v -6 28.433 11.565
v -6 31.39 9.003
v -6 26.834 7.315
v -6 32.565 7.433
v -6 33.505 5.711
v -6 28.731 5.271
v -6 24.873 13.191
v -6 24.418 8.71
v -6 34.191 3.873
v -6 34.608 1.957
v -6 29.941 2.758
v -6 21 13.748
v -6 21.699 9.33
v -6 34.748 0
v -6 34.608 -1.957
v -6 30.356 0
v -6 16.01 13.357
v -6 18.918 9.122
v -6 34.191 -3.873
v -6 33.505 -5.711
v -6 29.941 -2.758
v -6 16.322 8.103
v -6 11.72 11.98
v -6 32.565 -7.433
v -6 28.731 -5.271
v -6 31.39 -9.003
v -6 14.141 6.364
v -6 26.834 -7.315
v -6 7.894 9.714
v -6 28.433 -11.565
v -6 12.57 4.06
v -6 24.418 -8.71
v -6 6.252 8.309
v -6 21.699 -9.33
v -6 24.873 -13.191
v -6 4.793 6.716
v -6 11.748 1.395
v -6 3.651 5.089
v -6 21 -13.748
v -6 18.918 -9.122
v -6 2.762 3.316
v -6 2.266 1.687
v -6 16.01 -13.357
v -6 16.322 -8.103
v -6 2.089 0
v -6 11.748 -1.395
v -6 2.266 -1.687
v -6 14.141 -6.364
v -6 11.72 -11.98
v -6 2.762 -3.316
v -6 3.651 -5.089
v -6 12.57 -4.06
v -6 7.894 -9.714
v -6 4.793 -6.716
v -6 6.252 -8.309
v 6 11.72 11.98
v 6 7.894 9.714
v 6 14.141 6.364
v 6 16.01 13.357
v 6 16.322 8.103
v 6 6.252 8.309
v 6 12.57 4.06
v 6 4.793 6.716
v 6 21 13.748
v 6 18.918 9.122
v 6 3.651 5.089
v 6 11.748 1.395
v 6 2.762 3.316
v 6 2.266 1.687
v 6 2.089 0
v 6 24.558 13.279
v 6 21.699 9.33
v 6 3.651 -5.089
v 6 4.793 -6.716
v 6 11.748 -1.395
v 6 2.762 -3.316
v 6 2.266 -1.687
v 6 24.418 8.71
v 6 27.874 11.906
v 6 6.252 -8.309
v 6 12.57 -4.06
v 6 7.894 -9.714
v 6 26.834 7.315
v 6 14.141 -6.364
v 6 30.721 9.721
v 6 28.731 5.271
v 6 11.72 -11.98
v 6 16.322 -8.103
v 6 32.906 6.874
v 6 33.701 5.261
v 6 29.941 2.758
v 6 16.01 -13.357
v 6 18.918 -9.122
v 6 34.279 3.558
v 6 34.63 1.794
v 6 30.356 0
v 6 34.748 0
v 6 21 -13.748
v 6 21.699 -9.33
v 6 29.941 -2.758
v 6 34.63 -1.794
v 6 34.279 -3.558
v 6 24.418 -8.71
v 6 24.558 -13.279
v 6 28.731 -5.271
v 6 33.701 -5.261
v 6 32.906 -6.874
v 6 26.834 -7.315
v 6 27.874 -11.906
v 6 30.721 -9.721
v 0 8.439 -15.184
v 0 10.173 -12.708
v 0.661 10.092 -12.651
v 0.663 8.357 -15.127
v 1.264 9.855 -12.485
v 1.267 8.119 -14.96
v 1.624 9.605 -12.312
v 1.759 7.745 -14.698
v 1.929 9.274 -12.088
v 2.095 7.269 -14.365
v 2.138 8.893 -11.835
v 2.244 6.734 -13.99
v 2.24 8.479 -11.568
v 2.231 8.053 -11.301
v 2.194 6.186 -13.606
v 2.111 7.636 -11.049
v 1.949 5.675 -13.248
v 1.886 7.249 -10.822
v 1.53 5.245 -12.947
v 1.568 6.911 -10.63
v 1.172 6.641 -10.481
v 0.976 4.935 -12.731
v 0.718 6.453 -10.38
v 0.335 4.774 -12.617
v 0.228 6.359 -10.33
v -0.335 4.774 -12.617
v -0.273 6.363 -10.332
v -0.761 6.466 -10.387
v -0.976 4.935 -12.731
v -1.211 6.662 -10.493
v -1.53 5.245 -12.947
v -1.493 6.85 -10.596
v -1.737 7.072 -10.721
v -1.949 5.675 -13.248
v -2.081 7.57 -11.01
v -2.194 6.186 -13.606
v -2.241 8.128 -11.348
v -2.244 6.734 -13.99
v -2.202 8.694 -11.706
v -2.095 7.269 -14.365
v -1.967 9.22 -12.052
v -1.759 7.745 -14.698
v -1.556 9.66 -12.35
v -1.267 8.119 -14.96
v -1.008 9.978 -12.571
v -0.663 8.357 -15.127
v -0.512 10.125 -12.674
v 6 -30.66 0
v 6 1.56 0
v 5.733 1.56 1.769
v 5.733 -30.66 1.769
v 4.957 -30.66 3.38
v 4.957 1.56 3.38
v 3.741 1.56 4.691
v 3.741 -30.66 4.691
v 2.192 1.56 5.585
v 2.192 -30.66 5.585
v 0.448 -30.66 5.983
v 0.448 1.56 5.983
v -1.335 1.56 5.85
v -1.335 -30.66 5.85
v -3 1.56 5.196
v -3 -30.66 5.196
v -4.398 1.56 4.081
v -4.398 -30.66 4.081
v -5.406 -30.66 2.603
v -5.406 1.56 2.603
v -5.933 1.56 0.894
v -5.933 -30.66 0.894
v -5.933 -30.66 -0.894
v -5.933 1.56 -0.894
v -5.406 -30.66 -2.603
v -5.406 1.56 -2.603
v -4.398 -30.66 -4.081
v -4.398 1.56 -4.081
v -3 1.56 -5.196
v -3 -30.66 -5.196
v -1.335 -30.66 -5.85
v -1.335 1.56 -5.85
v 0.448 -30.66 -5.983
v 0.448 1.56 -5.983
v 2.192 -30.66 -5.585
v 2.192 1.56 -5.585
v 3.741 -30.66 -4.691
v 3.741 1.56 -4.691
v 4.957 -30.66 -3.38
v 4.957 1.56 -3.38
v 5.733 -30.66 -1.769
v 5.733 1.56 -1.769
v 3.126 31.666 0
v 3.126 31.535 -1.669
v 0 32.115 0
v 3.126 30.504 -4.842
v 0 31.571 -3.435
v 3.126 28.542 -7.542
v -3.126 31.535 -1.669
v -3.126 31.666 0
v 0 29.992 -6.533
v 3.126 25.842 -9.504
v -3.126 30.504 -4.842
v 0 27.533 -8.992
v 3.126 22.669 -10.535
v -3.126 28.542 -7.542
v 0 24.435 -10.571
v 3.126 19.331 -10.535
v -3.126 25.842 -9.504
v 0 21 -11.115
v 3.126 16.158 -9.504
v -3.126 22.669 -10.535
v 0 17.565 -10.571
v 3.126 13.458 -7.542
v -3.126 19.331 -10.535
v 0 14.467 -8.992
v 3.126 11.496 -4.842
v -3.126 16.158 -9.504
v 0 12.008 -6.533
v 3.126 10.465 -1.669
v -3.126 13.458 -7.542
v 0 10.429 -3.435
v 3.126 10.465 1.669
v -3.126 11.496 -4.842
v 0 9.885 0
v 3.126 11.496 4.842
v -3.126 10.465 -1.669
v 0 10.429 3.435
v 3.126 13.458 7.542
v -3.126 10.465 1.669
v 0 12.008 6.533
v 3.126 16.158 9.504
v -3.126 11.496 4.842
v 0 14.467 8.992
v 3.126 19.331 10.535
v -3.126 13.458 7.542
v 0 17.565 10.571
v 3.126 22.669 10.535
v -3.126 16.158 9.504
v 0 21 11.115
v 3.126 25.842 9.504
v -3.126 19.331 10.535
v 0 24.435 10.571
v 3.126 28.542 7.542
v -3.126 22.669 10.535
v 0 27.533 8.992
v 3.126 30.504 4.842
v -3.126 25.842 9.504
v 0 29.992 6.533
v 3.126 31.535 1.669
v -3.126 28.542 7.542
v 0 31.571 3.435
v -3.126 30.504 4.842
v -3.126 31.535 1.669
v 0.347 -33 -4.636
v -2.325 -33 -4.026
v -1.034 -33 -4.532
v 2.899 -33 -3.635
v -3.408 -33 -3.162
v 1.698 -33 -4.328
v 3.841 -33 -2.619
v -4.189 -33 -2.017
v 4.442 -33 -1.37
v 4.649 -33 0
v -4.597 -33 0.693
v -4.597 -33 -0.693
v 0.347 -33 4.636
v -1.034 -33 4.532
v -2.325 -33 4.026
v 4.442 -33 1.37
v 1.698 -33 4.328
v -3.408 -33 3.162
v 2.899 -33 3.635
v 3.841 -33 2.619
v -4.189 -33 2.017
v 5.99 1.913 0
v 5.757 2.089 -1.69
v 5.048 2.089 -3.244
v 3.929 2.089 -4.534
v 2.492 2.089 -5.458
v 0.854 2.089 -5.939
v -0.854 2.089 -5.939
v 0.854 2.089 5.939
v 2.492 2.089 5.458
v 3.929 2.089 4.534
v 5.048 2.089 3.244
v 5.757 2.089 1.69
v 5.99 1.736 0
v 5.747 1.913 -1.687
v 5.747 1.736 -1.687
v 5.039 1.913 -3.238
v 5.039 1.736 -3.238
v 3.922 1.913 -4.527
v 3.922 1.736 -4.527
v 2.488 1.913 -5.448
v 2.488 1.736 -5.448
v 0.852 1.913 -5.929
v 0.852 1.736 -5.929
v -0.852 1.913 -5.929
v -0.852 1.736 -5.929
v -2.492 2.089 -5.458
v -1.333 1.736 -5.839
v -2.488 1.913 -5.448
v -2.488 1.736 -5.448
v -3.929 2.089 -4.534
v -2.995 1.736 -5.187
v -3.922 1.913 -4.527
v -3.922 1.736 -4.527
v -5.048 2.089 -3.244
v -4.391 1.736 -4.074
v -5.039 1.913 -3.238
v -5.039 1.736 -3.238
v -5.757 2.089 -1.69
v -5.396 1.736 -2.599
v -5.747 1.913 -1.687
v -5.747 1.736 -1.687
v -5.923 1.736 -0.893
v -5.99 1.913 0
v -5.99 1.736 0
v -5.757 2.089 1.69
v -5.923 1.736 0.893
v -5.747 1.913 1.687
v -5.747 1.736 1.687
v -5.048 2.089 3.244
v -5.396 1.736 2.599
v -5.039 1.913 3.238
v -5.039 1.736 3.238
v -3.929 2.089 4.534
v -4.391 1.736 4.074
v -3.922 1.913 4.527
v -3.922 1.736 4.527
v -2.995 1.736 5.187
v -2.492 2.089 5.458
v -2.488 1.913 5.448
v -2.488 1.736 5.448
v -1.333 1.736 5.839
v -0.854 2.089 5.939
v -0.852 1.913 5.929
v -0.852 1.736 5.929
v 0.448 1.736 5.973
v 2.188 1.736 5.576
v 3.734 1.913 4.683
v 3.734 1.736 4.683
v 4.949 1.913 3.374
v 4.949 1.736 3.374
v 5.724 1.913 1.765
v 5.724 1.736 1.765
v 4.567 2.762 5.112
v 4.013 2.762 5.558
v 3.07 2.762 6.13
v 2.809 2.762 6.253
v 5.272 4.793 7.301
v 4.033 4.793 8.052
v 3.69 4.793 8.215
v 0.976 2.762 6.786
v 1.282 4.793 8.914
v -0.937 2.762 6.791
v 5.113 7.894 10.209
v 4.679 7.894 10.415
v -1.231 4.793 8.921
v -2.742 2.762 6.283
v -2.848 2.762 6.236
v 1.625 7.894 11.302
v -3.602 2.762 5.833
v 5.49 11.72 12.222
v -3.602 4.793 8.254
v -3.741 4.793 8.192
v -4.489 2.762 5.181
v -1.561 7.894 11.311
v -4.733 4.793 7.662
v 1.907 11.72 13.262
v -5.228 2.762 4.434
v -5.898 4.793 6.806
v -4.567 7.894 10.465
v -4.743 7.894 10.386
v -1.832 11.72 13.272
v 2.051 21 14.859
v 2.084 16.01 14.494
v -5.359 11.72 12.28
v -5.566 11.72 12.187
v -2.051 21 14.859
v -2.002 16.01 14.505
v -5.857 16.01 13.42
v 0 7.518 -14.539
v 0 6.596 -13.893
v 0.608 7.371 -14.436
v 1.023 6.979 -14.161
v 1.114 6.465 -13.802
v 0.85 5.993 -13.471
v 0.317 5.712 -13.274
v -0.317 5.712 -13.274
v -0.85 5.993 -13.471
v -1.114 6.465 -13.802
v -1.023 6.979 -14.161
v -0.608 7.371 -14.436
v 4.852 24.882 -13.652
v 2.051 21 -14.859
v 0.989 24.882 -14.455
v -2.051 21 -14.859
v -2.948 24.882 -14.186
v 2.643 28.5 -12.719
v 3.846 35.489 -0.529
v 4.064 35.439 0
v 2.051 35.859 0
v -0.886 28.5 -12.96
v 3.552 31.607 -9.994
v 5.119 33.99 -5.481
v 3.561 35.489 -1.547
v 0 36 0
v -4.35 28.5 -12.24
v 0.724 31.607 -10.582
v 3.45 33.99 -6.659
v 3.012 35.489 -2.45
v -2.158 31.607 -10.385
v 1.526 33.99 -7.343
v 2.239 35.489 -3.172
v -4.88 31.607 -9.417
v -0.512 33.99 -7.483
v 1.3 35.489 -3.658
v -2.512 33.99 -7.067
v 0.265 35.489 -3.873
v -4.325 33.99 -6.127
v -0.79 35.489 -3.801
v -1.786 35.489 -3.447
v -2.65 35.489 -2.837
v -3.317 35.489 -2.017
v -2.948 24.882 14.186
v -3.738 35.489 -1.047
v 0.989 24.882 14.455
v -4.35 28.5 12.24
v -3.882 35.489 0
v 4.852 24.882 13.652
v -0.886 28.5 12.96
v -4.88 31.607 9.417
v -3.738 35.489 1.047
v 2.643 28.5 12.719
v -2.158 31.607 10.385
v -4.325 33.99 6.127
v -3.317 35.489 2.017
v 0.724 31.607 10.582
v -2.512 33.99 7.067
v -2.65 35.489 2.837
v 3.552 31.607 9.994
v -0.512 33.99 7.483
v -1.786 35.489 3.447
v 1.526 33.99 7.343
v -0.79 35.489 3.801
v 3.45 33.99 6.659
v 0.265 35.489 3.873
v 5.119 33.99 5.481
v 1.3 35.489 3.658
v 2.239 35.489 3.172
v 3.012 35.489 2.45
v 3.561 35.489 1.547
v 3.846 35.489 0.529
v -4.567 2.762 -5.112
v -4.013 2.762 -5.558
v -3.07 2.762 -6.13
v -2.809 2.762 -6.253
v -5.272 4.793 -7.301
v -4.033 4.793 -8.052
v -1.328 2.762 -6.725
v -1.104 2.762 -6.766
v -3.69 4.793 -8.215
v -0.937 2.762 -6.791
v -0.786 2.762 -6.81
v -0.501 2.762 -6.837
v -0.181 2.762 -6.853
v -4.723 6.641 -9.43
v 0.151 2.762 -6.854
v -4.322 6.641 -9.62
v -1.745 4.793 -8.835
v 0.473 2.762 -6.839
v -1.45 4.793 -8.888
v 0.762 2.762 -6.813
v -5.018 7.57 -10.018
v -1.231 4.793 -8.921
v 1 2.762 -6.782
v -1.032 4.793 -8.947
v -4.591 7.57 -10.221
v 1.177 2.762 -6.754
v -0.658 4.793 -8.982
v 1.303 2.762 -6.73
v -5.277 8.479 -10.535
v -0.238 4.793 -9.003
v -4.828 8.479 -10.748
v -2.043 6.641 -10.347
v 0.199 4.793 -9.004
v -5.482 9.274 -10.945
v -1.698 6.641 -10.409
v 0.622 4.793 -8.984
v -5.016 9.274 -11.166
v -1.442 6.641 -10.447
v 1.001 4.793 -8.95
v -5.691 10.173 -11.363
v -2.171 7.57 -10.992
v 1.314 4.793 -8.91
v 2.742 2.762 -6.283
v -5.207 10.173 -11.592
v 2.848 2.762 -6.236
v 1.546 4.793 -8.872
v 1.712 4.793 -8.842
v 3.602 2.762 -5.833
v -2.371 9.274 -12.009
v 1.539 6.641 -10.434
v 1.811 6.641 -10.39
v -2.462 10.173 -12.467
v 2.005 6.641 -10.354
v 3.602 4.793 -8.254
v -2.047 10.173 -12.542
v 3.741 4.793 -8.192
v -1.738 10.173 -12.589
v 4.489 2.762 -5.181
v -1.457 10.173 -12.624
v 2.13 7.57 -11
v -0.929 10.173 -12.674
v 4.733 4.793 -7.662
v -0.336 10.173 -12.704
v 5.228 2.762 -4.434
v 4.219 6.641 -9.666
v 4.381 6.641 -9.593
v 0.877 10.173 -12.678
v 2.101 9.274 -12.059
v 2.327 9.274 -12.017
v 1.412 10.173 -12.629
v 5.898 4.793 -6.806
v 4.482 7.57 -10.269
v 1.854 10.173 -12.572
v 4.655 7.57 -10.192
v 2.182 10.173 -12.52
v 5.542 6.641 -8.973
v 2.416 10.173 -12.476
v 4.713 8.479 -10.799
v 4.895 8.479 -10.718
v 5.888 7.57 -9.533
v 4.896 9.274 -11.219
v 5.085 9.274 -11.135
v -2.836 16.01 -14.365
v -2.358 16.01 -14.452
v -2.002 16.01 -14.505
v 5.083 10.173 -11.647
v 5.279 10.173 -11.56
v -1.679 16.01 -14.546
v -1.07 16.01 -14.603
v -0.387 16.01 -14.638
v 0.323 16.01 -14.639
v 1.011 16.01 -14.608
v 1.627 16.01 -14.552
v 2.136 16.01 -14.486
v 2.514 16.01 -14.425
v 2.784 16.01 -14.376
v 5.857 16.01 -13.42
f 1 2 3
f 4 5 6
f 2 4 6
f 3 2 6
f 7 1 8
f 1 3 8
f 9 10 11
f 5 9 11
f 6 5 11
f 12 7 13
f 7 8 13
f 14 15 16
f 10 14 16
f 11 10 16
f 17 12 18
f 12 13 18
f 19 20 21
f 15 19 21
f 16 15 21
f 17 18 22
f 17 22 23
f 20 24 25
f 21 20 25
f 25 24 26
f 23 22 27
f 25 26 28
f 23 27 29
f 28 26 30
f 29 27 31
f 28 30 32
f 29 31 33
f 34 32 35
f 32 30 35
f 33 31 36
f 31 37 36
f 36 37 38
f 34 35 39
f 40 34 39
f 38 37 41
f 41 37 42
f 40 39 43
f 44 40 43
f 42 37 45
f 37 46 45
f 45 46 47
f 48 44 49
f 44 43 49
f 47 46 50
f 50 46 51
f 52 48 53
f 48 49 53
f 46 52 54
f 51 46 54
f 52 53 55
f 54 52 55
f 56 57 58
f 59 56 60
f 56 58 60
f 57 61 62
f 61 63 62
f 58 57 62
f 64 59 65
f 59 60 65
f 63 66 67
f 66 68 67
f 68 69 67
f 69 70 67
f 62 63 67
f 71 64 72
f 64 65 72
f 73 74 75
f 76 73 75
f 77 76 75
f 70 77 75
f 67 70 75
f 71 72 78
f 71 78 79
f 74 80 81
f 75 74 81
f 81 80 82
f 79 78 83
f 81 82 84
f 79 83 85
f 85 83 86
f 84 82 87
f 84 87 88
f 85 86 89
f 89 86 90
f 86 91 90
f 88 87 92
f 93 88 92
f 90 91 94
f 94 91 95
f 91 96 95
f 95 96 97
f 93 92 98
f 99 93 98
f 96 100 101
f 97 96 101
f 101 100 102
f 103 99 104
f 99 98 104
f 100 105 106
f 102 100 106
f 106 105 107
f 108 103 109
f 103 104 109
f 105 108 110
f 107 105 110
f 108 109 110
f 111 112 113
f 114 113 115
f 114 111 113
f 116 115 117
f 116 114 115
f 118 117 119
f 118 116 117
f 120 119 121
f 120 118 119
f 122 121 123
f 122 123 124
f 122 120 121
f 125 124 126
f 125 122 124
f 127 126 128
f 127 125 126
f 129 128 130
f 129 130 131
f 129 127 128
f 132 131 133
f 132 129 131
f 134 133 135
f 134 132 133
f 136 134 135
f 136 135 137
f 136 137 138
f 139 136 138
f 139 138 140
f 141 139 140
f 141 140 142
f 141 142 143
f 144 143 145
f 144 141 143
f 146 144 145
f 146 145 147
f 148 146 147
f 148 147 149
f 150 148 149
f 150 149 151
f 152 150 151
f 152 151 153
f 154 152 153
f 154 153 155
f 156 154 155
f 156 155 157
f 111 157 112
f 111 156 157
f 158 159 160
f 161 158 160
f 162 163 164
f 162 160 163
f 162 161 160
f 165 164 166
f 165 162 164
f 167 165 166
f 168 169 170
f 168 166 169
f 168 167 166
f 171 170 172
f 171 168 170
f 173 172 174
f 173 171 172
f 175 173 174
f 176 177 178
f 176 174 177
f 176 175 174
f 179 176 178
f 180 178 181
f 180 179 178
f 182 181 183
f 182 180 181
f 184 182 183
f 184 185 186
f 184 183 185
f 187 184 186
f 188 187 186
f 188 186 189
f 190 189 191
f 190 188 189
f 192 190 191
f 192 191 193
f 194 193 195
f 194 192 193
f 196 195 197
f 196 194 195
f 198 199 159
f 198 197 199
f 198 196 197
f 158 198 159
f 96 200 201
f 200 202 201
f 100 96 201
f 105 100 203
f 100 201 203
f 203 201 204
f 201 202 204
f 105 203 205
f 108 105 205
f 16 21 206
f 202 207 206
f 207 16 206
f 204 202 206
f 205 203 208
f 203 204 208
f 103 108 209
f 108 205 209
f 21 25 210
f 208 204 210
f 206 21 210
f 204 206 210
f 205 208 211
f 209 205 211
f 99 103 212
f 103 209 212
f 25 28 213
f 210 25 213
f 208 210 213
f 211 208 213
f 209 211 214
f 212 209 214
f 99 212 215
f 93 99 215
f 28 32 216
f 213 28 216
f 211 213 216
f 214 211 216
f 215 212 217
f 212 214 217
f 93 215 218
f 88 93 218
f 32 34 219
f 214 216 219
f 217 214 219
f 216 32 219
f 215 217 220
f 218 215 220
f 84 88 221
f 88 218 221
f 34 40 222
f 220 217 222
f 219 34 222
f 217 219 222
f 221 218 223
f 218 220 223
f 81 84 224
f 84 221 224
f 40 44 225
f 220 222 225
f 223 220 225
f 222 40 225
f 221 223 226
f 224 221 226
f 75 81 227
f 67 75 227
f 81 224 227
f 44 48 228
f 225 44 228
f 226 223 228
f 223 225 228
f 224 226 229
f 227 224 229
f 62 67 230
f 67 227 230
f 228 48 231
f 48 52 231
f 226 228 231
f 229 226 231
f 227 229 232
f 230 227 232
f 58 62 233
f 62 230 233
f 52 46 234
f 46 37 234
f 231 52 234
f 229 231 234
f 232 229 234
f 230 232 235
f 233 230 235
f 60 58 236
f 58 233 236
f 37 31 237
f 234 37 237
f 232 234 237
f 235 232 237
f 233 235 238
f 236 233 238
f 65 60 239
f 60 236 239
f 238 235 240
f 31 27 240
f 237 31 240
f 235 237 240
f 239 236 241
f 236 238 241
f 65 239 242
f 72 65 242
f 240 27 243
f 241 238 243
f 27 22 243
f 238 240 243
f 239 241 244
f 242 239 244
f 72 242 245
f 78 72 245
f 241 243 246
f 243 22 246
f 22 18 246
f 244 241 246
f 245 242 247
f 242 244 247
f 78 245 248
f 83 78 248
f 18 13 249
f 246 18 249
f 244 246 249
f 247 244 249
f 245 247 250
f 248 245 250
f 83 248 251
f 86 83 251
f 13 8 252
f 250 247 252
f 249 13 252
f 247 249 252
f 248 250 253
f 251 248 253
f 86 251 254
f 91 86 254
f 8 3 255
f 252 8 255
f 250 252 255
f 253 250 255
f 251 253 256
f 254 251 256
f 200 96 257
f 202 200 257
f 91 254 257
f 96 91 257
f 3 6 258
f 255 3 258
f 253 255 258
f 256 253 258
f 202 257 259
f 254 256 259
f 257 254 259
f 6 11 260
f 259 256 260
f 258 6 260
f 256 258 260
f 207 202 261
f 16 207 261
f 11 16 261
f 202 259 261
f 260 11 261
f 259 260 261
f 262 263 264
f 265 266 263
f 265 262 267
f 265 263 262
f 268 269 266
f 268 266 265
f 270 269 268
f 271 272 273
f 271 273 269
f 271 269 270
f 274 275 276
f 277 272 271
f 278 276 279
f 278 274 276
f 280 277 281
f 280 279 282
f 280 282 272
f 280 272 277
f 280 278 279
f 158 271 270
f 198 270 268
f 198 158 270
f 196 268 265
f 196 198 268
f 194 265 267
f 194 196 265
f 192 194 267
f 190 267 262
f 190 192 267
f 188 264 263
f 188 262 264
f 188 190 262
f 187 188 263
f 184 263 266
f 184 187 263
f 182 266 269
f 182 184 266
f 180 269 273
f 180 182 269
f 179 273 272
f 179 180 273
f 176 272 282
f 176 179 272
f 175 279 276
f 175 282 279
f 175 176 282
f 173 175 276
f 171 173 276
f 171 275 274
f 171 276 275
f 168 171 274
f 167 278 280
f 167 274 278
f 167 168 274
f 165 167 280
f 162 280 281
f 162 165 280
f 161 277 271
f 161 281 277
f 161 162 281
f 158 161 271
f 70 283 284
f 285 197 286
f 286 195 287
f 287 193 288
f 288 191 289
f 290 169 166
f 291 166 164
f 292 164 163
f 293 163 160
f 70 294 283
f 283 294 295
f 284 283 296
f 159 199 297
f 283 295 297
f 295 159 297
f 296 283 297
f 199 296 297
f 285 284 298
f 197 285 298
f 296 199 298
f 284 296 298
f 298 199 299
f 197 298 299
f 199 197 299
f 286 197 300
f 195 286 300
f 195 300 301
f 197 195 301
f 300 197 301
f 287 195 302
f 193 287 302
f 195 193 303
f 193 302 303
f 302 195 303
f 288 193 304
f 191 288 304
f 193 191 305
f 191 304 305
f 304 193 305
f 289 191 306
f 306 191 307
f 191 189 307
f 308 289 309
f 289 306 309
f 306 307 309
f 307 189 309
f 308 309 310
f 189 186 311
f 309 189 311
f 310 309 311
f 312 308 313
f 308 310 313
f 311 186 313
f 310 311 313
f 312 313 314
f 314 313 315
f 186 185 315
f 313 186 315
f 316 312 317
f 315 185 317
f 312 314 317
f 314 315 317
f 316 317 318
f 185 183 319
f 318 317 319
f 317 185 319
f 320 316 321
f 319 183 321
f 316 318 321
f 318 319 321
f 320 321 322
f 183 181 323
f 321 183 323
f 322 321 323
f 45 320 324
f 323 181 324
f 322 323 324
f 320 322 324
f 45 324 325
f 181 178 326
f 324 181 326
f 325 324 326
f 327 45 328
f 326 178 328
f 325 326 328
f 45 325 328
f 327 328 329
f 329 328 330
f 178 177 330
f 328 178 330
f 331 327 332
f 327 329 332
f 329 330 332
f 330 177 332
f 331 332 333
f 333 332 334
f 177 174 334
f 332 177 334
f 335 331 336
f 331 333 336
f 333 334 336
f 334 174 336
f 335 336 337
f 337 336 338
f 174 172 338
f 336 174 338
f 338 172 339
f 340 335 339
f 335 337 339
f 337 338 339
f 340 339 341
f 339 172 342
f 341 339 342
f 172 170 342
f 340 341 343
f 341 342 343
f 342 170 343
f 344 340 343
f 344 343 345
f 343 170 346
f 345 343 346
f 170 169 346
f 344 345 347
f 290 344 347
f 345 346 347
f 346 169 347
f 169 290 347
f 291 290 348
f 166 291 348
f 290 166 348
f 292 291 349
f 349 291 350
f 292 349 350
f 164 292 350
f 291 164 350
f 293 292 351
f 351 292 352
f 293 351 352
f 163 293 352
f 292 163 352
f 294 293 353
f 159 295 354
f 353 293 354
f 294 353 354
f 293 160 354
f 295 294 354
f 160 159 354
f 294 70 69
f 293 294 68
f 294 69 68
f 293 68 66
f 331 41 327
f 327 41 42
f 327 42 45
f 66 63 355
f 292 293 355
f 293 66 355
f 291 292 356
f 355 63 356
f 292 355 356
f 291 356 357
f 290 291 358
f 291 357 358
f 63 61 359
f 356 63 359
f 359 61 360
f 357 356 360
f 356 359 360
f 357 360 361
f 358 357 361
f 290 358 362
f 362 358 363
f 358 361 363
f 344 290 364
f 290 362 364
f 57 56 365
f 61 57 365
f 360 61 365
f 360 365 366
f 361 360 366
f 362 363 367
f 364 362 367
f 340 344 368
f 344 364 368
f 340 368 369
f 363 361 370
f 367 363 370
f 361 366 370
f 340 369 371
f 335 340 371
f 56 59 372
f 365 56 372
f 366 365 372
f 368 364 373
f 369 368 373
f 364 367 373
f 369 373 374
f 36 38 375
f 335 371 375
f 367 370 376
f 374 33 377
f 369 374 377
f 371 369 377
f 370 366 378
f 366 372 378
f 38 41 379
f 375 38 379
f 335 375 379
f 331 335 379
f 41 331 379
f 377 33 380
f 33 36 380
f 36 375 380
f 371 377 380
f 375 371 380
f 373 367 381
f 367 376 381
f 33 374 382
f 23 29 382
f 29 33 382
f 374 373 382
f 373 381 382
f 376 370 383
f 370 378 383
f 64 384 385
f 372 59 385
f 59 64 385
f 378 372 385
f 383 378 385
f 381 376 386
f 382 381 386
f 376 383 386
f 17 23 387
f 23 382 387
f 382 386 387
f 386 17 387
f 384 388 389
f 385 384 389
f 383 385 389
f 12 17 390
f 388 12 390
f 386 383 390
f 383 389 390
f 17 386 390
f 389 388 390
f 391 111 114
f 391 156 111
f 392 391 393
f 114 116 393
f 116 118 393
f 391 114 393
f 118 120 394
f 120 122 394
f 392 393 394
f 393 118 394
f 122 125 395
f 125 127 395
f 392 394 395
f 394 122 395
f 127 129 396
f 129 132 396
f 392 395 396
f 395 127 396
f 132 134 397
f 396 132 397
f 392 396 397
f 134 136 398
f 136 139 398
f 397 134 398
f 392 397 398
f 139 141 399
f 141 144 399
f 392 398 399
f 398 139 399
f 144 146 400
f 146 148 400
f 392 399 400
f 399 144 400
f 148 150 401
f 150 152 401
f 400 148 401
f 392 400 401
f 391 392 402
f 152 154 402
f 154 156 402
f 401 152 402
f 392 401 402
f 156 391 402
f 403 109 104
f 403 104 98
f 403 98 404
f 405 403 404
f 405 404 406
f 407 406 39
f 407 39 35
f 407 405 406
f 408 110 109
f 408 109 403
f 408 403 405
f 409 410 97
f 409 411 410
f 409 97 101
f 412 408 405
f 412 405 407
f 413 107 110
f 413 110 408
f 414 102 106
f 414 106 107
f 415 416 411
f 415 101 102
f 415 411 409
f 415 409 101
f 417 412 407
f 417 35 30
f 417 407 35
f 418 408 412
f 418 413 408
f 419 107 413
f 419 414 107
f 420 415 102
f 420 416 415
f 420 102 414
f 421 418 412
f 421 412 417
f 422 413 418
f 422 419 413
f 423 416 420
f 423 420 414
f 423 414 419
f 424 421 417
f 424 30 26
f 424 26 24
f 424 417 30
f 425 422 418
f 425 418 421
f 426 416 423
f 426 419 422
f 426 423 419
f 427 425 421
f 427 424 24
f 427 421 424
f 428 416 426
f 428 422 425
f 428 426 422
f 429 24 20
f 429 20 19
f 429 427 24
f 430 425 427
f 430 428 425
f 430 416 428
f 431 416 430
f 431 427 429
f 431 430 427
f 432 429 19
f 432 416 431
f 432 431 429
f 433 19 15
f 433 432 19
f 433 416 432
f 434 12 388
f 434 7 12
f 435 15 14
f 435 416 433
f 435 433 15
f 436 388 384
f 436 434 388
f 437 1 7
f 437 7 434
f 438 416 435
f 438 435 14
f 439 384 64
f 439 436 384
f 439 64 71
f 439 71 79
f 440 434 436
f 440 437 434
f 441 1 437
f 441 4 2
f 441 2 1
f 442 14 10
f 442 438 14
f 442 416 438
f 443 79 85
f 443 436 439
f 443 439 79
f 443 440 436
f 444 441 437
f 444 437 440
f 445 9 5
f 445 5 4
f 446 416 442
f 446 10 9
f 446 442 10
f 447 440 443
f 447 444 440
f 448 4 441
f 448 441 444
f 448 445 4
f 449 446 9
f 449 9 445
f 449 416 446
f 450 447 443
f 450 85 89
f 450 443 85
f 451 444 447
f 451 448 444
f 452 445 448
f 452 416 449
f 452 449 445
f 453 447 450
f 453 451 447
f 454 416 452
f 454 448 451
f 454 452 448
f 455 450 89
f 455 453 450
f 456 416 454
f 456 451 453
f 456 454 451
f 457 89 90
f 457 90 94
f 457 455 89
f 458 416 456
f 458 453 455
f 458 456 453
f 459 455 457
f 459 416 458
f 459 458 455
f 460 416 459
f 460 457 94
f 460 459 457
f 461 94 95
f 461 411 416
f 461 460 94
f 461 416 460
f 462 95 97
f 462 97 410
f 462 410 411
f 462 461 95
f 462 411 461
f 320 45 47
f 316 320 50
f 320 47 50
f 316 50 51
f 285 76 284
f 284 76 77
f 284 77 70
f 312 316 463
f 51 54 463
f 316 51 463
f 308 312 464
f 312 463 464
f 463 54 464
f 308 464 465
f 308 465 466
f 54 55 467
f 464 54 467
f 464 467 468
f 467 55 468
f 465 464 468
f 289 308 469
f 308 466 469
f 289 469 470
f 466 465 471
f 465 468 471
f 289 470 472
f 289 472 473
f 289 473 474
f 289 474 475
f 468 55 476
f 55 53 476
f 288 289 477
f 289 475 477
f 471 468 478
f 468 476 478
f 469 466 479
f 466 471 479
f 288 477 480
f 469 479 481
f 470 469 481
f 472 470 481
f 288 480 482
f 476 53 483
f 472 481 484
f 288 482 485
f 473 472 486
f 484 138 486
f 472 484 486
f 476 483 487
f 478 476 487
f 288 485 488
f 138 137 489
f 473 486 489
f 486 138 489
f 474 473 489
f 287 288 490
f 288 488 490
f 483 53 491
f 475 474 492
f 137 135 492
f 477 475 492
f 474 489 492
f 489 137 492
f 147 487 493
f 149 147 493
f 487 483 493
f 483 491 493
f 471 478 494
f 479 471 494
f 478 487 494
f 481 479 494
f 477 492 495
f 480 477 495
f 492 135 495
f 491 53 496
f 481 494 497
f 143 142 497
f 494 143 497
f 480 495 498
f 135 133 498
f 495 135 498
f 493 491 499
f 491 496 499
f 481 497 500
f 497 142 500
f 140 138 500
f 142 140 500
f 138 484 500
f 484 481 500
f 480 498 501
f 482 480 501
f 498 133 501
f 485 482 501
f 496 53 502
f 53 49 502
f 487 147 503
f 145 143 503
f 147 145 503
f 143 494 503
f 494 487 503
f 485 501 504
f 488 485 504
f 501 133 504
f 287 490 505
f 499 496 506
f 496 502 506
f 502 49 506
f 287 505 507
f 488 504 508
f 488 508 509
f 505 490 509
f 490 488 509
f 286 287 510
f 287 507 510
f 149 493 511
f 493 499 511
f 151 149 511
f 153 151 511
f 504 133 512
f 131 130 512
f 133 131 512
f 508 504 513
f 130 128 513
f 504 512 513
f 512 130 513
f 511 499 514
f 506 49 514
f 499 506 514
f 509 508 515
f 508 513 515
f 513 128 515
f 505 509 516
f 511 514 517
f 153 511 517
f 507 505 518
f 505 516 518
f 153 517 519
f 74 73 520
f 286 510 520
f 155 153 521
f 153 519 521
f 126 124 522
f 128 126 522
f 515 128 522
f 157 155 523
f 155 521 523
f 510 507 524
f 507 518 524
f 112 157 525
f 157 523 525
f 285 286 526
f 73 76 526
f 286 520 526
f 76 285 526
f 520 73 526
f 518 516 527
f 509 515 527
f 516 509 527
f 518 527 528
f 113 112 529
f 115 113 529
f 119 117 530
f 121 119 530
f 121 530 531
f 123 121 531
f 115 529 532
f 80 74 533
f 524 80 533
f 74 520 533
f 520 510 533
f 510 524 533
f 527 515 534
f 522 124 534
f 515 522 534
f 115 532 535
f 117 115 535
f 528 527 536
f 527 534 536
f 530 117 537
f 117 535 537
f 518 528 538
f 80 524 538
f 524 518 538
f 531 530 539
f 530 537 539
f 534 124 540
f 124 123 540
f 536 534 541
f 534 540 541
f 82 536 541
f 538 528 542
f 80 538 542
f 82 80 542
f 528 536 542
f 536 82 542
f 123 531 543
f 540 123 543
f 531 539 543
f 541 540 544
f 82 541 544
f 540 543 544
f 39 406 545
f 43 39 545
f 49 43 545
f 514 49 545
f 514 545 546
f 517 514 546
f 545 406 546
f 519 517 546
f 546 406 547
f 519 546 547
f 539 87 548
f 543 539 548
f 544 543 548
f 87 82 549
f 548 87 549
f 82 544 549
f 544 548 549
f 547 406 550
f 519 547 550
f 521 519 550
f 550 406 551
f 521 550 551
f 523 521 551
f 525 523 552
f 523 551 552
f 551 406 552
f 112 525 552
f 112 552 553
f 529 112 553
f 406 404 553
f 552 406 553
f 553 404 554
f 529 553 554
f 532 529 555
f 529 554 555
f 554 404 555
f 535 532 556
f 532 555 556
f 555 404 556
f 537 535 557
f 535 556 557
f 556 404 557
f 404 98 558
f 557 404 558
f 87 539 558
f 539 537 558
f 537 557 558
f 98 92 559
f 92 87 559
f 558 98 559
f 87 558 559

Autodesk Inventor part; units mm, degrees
sketch "Sketch_5" plane through (0, 0, 0) normal (0, 0, 1) x (1, 0, 0)
  line L0 (0, -33) -> (0, 36)
  arc A0 (15, 21) -> (0, 36) centre (0, 21) ccw
  arc A1 (6, 2.0892) -> (15, 21) centre (-7.4821, 20.1026) ccw
  arc A2 (6, 2.0892) -> (6, 1.56) centre (8.9883, 1.8246) ccw
  line L1 (6, 1.56) -> (6, -30.66)
  line L2 (6, -30.66) -> (4.649, -33)
  line L3 (4.649, -33) -> (0, -33)
  line L4 (0, -33) -> (0, 36)
revolve "Revolution1" add sketch "Sketch_5" angle 360 about axis through (0, -33, 0) along (0, -1, 0)
thread "Thread1" size "M12x1.75" class "6g" standard "ISO Metric profile" length 30.66
sketch "Sketch_6" plane through (0, 0, 0) normal (0, 0, 1) x (1, 0, 0)
  line L0 (-22.5, 37.8) -> (-22.5, -34.65)
  line L1 (-22.5, -34.65) -> (22.5, -34.65)
  line L2 (22.5, -34.65) -> (22.5, 37.8)
  line L3 (22.5, 37.8) -> (-22.5, 37.8)
  line L4 (-6, 36) -> (-6, -33)
  line L5 (-6, -33) -> (6, -33)
  line L6 (6, -33) -> (6, 36)
  line L7 (6, 36) -> (-6, 36)
extrude "Extrusion1" cut sketch "Sketch_6" along normal mid plane 30
sketch "Sketch_7" plane through (0, 0, 0) normal (0, 0, 1) x (1, 0, 0)
  line L0 (11.115, 21) -> (-11.115, 21)
  arc A0 (11.115, 21) -> (-11.115, 21) centre (0, 21) ccw
  line L1 (11.115, 21) -> (-11.115, 21)
revolve "Revolution2" cut sketch "Sketch_7" angle 360 about axis through (11.115, 21, 0) along (1, 0, 0)
sketch "Sketch_14" plane through (0, 0, 0) normal (1, 0, 0) x (0, 1, 0)
  line L0 (6.5961, -13.8934) -> (10.1809, -8.7737)
  line L1 (10.1809, -8.7737) -> (12.024, -10.0643)
  line L2 (12.024, -10.0643) -> (8.4392, -15.184)
  line L3 (8.4392, -15.184) -> (6.5961, -13.8934)
  line L4 (6.5961, -13.8934) -> (10.1809, -8.7737)
revolve "Revolution3" add sketch "Sketch_14" angle 360 about axis through (0, 6.5961, -13.8934) along (0, -0.5735764, -0.819152)
ref_plane "IP1_XY" through (0, 21, 0) normal (1, 0, 0) x (0, 0, -1)
ref_plane "IP1_YZ" through (0, 21, 0) normal (0, 0, -1) x (0, 1, 0)
ref_plane "IP1_ZX" through (0, 21, 0) normal (0, 1, 0) x (1, 0, 0)
properties part number "POS 12 Body"
